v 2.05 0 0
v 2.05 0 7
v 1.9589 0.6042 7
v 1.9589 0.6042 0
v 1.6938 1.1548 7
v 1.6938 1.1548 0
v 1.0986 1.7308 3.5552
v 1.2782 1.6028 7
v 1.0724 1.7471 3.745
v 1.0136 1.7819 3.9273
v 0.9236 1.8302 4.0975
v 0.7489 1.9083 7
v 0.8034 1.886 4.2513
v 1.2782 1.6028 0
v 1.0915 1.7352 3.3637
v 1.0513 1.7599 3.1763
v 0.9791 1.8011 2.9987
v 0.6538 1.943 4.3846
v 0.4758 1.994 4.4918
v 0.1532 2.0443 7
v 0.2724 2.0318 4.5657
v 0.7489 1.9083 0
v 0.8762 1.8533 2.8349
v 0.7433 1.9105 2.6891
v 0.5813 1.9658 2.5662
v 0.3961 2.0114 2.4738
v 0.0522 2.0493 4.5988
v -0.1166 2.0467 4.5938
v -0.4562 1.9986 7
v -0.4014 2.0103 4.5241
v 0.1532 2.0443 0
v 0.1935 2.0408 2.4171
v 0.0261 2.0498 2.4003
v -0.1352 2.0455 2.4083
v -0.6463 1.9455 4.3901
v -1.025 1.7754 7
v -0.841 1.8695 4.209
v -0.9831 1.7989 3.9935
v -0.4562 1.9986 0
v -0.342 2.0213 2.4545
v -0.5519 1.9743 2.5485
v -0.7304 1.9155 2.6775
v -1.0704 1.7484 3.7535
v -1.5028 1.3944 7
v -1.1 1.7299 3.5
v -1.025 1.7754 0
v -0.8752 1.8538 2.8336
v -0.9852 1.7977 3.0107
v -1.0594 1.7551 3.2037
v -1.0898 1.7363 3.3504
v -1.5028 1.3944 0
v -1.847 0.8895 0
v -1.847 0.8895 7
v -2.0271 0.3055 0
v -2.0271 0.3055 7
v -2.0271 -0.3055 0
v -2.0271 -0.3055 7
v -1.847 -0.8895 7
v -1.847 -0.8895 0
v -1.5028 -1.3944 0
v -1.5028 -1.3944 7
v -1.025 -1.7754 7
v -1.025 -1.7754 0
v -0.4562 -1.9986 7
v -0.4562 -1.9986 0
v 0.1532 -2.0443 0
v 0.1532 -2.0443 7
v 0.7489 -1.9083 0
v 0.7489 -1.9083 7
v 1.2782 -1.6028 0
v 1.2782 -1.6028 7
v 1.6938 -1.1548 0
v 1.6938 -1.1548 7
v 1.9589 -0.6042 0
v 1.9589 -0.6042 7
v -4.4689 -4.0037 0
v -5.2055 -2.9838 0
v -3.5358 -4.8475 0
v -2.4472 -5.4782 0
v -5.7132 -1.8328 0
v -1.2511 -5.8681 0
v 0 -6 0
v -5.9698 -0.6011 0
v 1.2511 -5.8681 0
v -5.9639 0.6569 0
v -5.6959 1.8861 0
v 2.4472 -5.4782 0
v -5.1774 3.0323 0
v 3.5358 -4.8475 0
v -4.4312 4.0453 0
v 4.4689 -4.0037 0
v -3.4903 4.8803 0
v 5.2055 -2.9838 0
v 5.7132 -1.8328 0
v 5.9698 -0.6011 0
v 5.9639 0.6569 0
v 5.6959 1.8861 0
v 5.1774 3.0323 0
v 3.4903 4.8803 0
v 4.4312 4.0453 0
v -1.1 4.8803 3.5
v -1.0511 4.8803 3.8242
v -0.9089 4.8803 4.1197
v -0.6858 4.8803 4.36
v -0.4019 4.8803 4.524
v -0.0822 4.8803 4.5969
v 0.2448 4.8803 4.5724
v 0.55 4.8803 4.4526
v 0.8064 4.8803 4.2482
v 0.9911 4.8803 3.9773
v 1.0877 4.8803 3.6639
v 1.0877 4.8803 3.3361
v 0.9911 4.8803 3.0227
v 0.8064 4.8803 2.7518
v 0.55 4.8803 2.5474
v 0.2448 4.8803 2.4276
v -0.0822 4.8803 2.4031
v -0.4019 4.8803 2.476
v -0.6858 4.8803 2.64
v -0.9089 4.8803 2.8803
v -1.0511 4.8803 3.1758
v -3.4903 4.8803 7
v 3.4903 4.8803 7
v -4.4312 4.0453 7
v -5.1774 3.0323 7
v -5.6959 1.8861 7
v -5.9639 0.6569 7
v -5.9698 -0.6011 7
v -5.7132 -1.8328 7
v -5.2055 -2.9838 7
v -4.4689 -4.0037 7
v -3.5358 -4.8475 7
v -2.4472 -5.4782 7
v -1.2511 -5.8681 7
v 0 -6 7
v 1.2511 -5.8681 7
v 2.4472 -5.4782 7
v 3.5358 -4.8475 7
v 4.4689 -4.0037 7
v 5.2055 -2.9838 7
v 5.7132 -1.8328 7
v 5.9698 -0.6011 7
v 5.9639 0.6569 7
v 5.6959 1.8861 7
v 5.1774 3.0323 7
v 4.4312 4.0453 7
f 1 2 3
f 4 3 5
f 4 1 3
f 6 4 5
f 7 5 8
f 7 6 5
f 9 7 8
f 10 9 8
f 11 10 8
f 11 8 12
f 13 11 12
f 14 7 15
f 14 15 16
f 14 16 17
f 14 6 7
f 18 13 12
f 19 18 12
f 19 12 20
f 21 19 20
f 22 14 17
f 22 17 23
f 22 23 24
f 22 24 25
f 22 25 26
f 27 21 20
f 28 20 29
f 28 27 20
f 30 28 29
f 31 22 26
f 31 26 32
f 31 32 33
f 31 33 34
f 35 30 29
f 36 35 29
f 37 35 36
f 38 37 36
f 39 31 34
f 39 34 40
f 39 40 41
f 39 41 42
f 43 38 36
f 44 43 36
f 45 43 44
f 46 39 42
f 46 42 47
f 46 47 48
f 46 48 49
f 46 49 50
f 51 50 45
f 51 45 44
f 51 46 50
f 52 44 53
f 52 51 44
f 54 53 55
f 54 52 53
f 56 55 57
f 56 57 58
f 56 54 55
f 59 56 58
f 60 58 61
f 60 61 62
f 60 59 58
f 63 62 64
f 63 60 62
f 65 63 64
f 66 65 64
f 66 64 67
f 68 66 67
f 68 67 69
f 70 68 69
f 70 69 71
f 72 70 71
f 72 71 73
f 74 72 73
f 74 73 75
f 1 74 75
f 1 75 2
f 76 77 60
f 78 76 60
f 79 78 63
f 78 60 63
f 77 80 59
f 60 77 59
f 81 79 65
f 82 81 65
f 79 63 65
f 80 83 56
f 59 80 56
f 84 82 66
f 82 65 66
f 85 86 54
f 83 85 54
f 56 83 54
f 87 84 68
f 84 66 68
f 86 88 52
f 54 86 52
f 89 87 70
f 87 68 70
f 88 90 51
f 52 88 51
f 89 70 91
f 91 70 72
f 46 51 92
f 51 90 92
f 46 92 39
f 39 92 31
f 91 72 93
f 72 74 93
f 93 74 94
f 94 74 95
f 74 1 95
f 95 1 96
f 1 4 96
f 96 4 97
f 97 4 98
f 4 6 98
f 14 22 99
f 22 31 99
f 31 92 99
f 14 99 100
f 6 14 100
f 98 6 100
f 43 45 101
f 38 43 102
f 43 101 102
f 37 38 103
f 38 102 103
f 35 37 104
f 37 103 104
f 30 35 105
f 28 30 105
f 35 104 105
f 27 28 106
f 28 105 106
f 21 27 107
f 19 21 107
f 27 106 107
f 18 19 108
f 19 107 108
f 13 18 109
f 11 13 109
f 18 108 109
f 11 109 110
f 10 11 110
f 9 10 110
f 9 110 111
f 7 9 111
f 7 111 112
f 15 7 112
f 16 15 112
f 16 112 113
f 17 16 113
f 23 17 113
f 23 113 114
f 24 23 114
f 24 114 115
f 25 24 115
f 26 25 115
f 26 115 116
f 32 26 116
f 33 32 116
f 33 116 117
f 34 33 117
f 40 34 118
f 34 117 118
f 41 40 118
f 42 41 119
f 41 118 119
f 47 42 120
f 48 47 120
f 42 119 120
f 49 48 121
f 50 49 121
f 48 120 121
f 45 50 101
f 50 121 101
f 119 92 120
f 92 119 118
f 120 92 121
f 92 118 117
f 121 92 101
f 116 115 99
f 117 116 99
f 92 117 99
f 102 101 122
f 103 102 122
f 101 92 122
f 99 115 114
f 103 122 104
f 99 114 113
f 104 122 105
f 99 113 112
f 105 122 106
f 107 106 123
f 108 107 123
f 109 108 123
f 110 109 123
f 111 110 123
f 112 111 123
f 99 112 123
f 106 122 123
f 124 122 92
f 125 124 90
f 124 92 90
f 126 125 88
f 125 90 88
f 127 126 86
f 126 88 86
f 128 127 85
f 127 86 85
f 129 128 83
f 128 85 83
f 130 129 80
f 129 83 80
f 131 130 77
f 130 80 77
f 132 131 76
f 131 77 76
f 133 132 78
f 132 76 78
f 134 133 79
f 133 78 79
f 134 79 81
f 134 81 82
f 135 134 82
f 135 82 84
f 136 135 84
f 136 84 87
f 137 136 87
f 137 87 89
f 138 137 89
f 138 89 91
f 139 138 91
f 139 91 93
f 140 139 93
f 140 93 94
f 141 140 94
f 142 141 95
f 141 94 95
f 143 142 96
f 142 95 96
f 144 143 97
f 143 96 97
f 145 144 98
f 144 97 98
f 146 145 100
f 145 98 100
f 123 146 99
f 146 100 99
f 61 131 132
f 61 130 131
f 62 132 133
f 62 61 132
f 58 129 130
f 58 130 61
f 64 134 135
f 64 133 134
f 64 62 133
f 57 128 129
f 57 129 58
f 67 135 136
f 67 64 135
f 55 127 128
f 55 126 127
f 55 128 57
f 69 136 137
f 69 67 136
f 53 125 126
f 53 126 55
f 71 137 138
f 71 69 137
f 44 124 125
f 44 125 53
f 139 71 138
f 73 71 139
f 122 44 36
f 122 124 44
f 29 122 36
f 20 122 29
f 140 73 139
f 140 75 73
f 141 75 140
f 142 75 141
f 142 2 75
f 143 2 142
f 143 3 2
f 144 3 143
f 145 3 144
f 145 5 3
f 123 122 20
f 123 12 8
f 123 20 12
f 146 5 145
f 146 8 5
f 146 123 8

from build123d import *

# Parameters (mm, degrees)
F0_R     = 6
F0_R_2   = 2.05
F1_DEPTH = 7
F3_DEPTH = 7.001
F4_R     = 1.1
F5_DEPTH = 4


with BuildPart() as f1:
    # F0 (on Top) → F1 (new body)
    with BuildSketch(Plane.XY):
        Circle(F0_R)
        Circle(F0_R_2, mode=Mode.SUBTRACT)
    extrude(amount=F1_DEPTH)

    # F2 (on face) → F3 (cut, through all)
    with BuildSketch(Plane.XY.offset(7)):
        with BuildLine():
            ThreePointArc((3.490318, 4.880336), (0, 6), (-3.490318, 4.880336))
            Line((-3.490318, 4.880336), (3.490318, 4.880336))
        make_face()
    extrude(amount=-F3_DEPTH, mode=Mode.SUBTRACT)

    # F4 (on face) → F5 (cut)
    with BuildSketch(Plane(origin=(0, 4.880336, 0), x_dir=(-1, 0, 0), z_dir=(0, 1, 0))):
        with Locations((0, 3.5)):
            Circle(F4_R)
    extrude(amount=-F5_DEPTH, mode=Mode.SUBTRACT)


solid = f1.part
